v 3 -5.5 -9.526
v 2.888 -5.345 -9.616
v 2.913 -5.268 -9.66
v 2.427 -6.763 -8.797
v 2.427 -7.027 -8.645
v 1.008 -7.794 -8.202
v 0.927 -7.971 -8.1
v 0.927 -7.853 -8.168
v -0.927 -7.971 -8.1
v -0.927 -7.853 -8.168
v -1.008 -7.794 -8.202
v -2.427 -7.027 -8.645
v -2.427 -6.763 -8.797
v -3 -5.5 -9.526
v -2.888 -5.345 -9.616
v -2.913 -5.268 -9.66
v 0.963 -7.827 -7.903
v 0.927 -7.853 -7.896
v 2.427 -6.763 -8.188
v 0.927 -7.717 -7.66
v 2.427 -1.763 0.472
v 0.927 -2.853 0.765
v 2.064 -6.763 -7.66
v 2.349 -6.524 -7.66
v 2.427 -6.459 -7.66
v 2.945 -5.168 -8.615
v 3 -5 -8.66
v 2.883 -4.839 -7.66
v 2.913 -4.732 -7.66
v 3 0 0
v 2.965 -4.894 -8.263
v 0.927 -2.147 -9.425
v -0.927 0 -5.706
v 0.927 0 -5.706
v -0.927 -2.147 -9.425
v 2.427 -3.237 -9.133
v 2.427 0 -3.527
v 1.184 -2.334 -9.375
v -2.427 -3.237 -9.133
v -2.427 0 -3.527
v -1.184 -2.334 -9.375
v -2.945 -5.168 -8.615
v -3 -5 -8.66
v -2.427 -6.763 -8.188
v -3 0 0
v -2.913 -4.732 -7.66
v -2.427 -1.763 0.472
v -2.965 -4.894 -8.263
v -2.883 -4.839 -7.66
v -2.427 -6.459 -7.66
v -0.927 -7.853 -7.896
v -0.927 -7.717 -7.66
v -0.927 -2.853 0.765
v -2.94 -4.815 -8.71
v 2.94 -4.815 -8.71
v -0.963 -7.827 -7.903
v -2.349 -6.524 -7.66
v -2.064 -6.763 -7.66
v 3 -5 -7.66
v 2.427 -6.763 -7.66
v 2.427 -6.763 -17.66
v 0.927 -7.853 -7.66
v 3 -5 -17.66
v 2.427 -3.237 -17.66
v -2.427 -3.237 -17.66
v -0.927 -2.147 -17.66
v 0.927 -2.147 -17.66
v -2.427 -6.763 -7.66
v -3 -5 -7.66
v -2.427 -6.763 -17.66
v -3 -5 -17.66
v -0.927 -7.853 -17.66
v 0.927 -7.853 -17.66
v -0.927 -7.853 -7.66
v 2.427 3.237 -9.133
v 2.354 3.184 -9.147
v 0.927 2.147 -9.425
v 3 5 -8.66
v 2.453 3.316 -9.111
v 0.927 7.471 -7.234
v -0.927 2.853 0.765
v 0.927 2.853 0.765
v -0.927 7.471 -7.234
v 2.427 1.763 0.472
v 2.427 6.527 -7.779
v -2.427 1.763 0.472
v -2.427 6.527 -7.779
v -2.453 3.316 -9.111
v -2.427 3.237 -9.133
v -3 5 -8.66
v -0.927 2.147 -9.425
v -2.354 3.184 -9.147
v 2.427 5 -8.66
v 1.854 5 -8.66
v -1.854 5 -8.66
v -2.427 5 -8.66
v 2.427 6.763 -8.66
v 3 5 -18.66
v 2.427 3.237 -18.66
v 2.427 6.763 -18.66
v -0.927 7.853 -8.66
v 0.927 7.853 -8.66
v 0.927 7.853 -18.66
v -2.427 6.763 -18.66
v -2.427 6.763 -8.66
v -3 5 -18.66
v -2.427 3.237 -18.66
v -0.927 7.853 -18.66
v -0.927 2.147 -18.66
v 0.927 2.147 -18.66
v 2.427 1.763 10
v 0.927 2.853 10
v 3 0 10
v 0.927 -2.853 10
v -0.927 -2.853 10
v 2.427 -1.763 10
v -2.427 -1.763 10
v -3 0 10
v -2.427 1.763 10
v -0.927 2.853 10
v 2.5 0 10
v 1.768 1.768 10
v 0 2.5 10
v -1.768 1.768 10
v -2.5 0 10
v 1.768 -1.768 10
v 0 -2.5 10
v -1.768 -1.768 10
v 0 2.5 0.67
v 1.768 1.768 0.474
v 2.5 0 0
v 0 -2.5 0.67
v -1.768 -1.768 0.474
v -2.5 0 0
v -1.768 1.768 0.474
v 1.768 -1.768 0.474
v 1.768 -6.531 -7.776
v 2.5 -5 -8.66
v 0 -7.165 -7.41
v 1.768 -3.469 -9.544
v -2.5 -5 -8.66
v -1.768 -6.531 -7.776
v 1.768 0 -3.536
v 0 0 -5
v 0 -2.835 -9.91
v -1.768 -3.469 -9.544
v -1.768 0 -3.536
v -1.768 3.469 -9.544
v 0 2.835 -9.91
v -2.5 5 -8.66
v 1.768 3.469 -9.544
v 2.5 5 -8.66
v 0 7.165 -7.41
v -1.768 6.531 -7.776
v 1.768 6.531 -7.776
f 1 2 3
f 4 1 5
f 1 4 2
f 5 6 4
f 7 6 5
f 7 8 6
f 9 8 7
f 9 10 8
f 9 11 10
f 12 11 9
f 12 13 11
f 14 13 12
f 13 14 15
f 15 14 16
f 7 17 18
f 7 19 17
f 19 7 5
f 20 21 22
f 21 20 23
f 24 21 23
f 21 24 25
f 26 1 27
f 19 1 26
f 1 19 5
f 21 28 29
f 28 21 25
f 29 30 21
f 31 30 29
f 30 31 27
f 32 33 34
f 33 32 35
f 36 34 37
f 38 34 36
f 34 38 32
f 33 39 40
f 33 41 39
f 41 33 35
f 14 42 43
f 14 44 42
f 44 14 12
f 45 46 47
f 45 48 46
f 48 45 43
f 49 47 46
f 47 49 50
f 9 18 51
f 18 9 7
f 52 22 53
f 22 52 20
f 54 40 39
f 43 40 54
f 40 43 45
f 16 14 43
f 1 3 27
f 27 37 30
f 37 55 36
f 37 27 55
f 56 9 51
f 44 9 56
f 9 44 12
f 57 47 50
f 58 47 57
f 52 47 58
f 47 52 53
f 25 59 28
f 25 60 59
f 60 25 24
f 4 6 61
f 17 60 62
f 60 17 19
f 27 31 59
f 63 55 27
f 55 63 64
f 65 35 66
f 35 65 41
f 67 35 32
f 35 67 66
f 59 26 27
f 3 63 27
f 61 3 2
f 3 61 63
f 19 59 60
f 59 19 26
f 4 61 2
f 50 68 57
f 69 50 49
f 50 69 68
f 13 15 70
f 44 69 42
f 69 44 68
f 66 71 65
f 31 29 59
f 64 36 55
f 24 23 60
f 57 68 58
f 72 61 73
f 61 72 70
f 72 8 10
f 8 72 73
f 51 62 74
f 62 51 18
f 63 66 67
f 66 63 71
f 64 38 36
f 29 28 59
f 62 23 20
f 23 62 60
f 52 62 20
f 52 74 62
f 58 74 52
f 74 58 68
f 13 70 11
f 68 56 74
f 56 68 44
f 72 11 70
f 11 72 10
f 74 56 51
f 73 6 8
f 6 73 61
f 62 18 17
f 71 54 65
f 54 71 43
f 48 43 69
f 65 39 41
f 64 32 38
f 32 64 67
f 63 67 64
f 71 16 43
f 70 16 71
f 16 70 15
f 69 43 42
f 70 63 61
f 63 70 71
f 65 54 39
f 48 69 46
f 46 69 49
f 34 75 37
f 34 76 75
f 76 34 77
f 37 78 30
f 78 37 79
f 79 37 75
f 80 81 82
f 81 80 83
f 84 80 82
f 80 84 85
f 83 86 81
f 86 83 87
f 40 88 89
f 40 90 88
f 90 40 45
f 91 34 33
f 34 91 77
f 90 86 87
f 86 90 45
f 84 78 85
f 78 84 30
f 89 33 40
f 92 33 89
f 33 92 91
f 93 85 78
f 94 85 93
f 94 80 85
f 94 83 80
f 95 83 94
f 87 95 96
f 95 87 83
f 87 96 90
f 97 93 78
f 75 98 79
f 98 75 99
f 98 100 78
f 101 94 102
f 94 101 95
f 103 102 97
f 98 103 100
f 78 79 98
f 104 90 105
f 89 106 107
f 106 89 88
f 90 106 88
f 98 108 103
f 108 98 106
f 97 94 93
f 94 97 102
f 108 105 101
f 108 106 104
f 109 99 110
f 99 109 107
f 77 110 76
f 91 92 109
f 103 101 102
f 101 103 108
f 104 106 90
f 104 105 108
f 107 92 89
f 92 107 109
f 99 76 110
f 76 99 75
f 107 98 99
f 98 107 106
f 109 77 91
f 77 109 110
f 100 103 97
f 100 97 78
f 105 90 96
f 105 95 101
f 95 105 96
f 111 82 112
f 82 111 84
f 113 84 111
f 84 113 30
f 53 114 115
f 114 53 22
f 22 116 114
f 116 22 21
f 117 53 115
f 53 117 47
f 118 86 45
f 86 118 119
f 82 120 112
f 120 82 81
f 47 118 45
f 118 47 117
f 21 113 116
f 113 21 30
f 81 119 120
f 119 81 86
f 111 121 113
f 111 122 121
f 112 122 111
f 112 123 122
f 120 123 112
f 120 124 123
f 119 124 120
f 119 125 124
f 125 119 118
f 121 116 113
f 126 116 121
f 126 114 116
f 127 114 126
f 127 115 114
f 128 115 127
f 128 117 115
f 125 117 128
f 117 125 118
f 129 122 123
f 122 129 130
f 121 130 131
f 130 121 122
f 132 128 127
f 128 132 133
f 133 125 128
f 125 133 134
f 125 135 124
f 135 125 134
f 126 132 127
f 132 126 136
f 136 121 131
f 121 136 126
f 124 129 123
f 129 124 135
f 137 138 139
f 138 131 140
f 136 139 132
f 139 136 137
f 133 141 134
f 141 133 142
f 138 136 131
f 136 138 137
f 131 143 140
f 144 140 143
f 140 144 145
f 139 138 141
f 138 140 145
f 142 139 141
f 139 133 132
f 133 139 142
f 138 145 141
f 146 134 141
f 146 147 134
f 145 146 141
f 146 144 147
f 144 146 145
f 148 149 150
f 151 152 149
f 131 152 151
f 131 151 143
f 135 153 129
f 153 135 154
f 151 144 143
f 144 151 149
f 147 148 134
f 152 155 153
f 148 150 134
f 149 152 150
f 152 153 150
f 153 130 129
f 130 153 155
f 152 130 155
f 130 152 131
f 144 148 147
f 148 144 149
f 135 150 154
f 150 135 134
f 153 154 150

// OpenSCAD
module cylinder(diameter, length) {
  linear_extrude(height=length) {
    circle(d=diameter);
  }
}

difference() {
  union() {
    bend = 150;
    cylinder(6, 10);
    rotate([bend, 0, 0]) {
      cylinder(6, 11);
      translate([0, 0, 10]) {
        rotate([180-bend, 0, 0]) {
          translate([0,0,-1]) {
            cylinder(6, 10);
          }
        }
      }
    }
    rotate([-bend, 0, 0]) {
      cylinder(6, 10);
      translate([0, 0, 10]) {
        rotate([-(180-bend), 0, 0]) {
          cylinder(6, 10);
        }
      }
    }
  }
  union() {
    cylinder(5, 11);
    rotate([150, 0, 0]) {
      cylinder(5, 10);
    }
    rotate([-150, 0, 0]) {
      cylinder(5, 10);
    }
  }
}
